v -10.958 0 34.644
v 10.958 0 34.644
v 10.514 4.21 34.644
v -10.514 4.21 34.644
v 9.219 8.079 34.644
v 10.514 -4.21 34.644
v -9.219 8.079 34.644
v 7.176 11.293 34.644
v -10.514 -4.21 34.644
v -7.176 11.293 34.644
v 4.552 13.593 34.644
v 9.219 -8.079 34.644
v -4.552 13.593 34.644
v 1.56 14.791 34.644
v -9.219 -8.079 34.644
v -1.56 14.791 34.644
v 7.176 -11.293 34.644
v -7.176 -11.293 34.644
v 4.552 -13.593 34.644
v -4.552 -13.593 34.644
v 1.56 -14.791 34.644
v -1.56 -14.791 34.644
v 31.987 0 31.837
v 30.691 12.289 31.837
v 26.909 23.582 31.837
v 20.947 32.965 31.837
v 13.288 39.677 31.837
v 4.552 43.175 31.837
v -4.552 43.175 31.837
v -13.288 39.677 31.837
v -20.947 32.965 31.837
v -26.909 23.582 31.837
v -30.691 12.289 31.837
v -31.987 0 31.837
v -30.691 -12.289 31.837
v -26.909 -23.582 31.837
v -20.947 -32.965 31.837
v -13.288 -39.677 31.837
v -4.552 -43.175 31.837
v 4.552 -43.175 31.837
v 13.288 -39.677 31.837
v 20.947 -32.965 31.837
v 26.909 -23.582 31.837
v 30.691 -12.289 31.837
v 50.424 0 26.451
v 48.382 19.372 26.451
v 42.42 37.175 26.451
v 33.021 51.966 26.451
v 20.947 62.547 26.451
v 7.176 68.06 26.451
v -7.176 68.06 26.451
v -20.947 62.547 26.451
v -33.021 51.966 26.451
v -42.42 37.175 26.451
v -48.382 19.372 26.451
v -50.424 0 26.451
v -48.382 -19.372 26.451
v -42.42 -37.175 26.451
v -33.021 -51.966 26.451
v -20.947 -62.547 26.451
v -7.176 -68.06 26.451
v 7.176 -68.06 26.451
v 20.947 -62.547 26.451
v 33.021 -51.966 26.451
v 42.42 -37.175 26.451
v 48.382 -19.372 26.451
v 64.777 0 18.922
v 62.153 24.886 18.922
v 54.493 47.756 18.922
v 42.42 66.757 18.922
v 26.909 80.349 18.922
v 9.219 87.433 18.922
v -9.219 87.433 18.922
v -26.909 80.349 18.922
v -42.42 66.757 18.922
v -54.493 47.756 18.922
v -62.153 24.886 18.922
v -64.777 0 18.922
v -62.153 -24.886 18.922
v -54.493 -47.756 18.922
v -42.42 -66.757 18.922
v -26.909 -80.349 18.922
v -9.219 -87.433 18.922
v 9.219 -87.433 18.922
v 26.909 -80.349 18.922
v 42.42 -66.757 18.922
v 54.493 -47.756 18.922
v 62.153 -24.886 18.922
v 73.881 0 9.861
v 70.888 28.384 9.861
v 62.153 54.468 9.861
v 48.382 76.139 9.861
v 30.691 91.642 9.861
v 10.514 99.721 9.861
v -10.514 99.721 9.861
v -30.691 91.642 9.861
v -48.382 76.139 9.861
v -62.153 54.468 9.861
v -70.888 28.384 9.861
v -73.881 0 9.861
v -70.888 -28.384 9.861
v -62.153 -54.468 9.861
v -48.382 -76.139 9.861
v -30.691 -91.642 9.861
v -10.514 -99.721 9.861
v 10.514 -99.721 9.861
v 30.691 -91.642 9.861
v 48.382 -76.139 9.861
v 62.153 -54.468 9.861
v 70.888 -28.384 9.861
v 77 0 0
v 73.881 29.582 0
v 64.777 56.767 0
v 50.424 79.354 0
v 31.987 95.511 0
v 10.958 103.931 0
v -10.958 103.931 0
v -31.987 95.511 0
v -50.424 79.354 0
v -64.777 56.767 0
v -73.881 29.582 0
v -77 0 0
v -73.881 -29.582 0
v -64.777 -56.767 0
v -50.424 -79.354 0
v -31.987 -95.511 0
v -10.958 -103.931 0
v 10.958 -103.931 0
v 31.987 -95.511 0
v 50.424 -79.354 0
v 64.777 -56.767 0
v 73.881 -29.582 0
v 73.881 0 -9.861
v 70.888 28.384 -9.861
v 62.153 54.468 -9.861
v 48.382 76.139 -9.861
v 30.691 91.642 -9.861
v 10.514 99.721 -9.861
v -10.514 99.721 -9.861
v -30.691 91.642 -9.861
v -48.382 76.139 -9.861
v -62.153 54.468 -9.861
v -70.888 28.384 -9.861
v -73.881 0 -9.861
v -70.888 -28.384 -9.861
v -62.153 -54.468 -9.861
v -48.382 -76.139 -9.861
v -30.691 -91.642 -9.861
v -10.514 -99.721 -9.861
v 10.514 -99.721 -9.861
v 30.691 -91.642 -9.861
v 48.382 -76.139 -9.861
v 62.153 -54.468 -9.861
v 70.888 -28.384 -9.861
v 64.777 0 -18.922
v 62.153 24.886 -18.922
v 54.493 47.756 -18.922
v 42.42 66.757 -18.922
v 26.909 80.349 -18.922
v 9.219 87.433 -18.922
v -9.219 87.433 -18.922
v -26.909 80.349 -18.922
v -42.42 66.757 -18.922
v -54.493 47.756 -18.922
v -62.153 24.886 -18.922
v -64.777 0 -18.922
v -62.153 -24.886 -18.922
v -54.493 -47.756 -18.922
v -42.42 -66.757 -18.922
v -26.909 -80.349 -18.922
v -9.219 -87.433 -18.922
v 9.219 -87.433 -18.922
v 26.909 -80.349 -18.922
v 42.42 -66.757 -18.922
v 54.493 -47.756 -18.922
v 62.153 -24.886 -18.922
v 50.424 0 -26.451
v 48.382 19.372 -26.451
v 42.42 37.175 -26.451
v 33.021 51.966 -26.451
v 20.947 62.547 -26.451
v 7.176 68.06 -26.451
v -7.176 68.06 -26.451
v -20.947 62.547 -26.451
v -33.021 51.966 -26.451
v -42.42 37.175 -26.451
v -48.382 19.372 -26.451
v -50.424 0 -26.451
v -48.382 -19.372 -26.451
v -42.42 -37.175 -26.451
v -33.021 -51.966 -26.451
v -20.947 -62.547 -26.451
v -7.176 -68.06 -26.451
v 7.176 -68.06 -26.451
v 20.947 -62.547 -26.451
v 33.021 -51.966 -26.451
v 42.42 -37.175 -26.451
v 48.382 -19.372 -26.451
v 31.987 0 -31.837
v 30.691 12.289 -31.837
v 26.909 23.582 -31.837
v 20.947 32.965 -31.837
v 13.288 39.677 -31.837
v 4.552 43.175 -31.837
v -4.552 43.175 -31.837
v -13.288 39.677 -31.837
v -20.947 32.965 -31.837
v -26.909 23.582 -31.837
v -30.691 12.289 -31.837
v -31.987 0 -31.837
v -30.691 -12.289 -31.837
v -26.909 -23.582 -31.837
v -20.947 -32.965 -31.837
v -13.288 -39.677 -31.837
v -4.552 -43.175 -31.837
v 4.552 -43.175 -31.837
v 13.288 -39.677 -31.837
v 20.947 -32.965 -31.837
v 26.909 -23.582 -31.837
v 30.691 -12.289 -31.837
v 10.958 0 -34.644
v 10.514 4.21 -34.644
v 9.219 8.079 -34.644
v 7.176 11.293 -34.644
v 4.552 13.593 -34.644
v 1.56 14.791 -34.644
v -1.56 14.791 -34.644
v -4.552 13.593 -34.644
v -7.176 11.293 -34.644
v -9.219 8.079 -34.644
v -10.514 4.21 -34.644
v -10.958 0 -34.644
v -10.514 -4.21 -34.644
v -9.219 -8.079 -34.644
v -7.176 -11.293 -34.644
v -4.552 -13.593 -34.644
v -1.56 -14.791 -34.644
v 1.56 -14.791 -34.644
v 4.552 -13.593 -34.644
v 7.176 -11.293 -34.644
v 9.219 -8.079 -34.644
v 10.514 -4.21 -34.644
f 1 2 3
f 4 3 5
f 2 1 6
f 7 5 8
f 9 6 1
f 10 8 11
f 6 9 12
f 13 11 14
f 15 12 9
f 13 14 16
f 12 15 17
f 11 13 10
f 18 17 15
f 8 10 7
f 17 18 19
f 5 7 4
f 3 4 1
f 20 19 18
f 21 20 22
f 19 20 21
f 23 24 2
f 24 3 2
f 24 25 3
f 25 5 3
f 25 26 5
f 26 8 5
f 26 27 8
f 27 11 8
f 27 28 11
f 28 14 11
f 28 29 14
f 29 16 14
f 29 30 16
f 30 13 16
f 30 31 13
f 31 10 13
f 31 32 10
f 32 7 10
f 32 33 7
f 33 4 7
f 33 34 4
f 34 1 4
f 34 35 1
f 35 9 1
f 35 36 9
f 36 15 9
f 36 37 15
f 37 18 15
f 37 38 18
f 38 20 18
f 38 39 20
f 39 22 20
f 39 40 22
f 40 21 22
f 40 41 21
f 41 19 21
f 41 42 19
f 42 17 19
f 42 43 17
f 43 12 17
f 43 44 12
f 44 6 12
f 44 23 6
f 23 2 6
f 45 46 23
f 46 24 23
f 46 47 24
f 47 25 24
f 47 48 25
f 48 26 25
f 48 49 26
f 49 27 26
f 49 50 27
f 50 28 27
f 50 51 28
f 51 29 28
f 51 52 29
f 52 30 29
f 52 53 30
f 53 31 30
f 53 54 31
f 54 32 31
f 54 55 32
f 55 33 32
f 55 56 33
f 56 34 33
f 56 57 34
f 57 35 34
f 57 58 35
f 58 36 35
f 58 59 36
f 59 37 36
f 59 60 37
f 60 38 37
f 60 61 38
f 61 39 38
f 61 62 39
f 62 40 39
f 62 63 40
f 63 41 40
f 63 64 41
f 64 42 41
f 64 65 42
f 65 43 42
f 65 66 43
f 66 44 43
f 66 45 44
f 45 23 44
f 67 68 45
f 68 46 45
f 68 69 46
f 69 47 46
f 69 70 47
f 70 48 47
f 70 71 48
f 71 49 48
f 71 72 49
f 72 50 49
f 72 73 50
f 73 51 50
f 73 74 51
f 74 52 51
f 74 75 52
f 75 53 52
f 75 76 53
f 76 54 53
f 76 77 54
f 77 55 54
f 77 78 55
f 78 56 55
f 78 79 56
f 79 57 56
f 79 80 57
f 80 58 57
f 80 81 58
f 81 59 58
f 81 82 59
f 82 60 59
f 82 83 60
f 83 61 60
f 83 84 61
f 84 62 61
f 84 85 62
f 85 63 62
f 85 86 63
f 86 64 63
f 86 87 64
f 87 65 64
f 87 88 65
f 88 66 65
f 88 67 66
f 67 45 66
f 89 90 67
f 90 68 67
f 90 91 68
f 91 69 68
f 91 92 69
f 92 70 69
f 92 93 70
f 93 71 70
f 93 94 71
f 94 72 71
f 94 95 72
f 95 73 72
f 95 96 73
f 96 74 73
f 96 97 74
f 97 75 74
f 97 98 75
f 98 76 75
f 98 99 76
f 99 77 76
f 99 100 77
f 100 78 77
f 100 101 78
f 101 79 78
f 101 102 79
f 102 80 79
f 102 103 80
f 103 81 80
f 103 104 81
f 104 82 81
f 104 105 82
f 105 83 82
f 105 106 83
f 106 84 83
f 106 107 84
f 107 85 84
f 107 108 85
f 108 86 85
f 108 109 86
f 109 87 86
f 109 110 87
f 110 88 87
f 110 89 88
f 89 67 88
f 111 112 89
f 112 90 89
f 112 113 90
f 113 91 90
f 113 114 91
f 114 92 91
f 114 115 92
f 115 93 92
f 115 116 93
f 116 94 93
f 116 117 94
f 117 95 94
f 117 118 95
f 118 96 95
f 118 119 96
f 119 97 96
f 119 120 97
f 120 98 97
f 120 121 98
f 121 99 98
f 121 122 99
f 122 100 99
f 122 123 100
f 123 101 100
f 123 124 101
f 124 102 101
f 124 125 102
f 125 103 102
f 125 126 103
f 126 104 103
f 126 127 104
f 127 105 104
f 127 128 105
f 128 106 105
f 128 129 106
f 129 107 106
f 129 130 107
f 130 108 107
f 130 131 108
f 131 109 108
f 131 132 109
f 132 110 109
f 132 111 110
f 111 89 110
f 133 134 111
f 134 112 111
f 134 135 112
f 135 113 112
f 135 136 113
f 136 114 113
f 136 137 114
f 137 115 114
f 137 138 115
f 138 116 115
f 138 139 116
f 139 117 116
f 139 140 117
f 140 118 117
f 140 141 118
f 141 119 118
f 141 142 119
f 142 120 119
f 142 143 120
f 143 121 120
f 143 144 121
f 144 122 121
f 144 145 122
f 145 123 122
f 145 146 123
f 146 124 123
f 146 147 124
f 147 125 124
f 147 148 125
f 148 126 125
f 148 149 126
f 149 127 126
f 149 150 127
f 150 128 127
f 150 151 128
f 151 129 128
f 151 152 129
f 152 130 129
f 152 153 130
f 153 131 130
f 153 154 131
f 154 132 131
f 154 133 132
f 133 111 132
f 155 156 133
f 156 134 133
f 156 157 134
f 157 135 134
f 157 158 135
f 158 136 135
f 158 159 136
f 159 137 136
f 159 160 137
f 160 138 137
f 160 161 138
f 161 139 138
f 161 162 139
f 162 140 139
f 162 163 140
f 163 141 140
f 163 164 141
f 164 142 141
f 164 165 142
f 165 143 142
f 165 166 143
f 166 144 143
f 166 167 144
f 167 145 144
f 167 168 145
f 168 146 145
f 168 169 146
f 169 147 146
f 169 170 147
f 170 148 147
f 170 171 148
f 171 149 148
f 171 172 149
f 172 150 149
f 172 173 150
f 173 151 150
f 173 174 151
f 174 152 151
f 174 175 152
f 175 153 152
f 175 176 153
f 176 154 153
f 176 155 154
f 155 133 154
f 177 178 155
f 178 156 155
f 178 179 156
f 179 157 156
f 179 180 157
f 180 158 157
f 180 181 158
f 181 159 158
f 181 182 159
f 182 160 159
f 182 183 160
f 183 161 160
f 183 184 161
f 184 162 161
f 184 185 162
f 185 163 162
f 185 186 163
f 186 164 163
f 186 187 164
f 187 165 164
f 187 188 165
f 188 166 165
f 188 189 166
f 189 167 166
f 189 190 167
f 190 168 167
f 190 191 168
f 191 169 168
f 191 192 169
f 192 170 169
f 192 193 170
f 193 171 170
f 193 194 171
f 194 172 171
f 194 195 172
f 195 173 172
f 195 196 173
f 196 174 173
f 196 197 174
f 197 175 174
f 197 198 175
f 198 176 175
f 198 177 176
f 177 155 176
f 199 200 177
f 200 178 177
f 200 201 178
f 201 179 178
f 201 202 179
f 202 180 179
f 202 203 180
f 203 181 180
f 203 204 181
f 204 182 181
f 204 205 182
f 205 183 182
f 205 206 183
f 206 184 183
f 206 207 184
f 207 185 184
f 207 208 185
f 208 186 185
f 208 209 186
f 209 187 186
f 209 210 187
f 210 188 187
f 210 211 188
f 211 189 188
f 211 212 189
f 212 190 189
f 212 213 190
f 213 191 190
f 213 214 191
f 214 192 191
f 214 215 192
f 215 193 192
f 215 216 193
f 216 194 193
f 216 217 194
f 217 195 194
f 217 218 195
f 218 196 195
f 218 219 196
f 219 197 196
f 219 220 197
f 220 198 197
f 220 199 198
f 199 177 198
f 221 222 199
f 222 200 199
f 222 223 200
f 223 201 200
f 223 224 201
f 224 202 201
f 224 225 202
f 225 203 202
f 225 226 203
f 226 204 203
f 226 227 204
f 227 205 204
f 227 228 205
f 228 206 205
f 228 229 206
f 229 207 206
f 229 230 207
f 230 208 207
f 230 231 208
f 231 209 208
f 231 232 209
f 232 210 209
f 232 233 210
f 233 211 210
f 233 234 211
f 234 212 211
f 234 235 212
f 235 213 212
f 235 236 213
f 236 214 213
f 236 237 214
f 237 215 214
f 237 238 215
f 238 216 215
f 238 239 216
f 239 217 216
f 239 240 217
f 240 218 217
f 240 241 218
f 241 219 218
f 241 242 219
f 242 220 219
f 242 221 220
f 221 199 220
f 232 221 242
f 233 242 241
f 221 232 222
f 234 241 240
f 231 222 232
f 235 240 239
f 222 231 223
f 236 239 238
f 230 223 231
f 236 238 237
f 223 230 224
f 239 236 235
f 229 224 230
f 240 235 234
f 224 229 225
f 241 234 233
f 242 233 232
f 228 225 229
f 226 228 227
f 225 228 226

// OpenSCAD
// Generated by SolidPython 1.0.1 on 2020-07-29 00:46:50


scale(v = [11, 15, 5]) {
	sphere(r = 7);
}
/***********************************************
*********      SolidPython code:      **********
************************************************
 
# import packages: SolidPython
from solid import *
from solid.utils import *
from itertools import chain, combinations, permutations


class Resize:

    def __init__(self, scad_file):
        self.scad_file = scad_file
        #self.scad_file = import_scad(scad_file)
        # cone/cylinder param:
        self.r1 = 0
        self.r2 = 0
        self.h = 0
        # rectangular prism param:
        self.w = 0
        self.l = 0
        # ellipse param:
        self.r = 0

    # import OpenScad code (file name corresponds to shape)


    # classify shape + parameters
    def assign(self, param1, param2, param3):
        if self.scad_file == 'cone.scad':
            self.r1 = param1
            self.r2 = param2
            self.h = param3
        elif self.scad_file == 'cylinder.scad':
            self.r1 = param1
            self.r2 = param2
            self.h = param3
        elif self.scad_file == 'rectangularPrism.scad':
            self.h = param1
            self.l = param2
            self.w = param3
        else:
            self.r = param1
            self.h = param2

    # resize parameters
    def iterate(self):
        x = range(3, 20, 2)
        i = 1
        if self.scad_file == 'cone.scad':
            tempList = list(permutations(x, 2))
            for temp in tempList:
                param1 = temp[0]
                param2 = temp[1]
                filepath = 'produced_scad_files/' + 'cone' + str(param1) + '_' + str(param2) + '_' + '.scad'
                scad_render_to_file(cylinder(h=param1, r1=param2, r2=0), filepath)

        elif self.scad_file == 'cylinder.scad':
            tempList = list(permutations(x, 3))
            for temp in tempList:
                param1 = temp[0]
                param2 = temp[1]
                filepath = 'produced_scad_files/' + 'cylinder' + str(param1) + '_' + str(param2) + '_' + '.scad'
                scad_render_to_file(cylinder(h=param1, r1=param2, r2=param2), filepath)

        elif self.scad_file == 'rectangularPrism.scad':
            tempList = list(permutations(x, 3))
            for temp in tempList:
                param1 = temp[0]
                param2 = temp[1]
                param3 = temp[2]
                filepath = 'produced_scad_files/' + 'rectangularPrism' + str(param1) + '_' + str(param2) + '_' + str(
                    param3) + '.scad'
                scad_render_to_file(cube(size=(param1, param2, param3)), filepath)

        elif self.scad_file == 'ellipse.scad':
            tempList = list(permutations(x, 4))
            for temp in tempList:
                param1 = temp[0]
                param2 = temp[1]
                param3 = temp[2]
                param4 = temp[3]
                filepath = 'produced_scad_files/' + 'ellipse' + str(param1) + '_' + str(param2) + '_' + str(param3) + '_' + str(param4) + '.scad'
                scad_render_to_file(scale([param1, param2, param3])(sphere(r=param4)), filepath)

    def render_to_scadfile(self):
        scad_render_to_file(scad, 'example.scad') 
 
************************************************/
